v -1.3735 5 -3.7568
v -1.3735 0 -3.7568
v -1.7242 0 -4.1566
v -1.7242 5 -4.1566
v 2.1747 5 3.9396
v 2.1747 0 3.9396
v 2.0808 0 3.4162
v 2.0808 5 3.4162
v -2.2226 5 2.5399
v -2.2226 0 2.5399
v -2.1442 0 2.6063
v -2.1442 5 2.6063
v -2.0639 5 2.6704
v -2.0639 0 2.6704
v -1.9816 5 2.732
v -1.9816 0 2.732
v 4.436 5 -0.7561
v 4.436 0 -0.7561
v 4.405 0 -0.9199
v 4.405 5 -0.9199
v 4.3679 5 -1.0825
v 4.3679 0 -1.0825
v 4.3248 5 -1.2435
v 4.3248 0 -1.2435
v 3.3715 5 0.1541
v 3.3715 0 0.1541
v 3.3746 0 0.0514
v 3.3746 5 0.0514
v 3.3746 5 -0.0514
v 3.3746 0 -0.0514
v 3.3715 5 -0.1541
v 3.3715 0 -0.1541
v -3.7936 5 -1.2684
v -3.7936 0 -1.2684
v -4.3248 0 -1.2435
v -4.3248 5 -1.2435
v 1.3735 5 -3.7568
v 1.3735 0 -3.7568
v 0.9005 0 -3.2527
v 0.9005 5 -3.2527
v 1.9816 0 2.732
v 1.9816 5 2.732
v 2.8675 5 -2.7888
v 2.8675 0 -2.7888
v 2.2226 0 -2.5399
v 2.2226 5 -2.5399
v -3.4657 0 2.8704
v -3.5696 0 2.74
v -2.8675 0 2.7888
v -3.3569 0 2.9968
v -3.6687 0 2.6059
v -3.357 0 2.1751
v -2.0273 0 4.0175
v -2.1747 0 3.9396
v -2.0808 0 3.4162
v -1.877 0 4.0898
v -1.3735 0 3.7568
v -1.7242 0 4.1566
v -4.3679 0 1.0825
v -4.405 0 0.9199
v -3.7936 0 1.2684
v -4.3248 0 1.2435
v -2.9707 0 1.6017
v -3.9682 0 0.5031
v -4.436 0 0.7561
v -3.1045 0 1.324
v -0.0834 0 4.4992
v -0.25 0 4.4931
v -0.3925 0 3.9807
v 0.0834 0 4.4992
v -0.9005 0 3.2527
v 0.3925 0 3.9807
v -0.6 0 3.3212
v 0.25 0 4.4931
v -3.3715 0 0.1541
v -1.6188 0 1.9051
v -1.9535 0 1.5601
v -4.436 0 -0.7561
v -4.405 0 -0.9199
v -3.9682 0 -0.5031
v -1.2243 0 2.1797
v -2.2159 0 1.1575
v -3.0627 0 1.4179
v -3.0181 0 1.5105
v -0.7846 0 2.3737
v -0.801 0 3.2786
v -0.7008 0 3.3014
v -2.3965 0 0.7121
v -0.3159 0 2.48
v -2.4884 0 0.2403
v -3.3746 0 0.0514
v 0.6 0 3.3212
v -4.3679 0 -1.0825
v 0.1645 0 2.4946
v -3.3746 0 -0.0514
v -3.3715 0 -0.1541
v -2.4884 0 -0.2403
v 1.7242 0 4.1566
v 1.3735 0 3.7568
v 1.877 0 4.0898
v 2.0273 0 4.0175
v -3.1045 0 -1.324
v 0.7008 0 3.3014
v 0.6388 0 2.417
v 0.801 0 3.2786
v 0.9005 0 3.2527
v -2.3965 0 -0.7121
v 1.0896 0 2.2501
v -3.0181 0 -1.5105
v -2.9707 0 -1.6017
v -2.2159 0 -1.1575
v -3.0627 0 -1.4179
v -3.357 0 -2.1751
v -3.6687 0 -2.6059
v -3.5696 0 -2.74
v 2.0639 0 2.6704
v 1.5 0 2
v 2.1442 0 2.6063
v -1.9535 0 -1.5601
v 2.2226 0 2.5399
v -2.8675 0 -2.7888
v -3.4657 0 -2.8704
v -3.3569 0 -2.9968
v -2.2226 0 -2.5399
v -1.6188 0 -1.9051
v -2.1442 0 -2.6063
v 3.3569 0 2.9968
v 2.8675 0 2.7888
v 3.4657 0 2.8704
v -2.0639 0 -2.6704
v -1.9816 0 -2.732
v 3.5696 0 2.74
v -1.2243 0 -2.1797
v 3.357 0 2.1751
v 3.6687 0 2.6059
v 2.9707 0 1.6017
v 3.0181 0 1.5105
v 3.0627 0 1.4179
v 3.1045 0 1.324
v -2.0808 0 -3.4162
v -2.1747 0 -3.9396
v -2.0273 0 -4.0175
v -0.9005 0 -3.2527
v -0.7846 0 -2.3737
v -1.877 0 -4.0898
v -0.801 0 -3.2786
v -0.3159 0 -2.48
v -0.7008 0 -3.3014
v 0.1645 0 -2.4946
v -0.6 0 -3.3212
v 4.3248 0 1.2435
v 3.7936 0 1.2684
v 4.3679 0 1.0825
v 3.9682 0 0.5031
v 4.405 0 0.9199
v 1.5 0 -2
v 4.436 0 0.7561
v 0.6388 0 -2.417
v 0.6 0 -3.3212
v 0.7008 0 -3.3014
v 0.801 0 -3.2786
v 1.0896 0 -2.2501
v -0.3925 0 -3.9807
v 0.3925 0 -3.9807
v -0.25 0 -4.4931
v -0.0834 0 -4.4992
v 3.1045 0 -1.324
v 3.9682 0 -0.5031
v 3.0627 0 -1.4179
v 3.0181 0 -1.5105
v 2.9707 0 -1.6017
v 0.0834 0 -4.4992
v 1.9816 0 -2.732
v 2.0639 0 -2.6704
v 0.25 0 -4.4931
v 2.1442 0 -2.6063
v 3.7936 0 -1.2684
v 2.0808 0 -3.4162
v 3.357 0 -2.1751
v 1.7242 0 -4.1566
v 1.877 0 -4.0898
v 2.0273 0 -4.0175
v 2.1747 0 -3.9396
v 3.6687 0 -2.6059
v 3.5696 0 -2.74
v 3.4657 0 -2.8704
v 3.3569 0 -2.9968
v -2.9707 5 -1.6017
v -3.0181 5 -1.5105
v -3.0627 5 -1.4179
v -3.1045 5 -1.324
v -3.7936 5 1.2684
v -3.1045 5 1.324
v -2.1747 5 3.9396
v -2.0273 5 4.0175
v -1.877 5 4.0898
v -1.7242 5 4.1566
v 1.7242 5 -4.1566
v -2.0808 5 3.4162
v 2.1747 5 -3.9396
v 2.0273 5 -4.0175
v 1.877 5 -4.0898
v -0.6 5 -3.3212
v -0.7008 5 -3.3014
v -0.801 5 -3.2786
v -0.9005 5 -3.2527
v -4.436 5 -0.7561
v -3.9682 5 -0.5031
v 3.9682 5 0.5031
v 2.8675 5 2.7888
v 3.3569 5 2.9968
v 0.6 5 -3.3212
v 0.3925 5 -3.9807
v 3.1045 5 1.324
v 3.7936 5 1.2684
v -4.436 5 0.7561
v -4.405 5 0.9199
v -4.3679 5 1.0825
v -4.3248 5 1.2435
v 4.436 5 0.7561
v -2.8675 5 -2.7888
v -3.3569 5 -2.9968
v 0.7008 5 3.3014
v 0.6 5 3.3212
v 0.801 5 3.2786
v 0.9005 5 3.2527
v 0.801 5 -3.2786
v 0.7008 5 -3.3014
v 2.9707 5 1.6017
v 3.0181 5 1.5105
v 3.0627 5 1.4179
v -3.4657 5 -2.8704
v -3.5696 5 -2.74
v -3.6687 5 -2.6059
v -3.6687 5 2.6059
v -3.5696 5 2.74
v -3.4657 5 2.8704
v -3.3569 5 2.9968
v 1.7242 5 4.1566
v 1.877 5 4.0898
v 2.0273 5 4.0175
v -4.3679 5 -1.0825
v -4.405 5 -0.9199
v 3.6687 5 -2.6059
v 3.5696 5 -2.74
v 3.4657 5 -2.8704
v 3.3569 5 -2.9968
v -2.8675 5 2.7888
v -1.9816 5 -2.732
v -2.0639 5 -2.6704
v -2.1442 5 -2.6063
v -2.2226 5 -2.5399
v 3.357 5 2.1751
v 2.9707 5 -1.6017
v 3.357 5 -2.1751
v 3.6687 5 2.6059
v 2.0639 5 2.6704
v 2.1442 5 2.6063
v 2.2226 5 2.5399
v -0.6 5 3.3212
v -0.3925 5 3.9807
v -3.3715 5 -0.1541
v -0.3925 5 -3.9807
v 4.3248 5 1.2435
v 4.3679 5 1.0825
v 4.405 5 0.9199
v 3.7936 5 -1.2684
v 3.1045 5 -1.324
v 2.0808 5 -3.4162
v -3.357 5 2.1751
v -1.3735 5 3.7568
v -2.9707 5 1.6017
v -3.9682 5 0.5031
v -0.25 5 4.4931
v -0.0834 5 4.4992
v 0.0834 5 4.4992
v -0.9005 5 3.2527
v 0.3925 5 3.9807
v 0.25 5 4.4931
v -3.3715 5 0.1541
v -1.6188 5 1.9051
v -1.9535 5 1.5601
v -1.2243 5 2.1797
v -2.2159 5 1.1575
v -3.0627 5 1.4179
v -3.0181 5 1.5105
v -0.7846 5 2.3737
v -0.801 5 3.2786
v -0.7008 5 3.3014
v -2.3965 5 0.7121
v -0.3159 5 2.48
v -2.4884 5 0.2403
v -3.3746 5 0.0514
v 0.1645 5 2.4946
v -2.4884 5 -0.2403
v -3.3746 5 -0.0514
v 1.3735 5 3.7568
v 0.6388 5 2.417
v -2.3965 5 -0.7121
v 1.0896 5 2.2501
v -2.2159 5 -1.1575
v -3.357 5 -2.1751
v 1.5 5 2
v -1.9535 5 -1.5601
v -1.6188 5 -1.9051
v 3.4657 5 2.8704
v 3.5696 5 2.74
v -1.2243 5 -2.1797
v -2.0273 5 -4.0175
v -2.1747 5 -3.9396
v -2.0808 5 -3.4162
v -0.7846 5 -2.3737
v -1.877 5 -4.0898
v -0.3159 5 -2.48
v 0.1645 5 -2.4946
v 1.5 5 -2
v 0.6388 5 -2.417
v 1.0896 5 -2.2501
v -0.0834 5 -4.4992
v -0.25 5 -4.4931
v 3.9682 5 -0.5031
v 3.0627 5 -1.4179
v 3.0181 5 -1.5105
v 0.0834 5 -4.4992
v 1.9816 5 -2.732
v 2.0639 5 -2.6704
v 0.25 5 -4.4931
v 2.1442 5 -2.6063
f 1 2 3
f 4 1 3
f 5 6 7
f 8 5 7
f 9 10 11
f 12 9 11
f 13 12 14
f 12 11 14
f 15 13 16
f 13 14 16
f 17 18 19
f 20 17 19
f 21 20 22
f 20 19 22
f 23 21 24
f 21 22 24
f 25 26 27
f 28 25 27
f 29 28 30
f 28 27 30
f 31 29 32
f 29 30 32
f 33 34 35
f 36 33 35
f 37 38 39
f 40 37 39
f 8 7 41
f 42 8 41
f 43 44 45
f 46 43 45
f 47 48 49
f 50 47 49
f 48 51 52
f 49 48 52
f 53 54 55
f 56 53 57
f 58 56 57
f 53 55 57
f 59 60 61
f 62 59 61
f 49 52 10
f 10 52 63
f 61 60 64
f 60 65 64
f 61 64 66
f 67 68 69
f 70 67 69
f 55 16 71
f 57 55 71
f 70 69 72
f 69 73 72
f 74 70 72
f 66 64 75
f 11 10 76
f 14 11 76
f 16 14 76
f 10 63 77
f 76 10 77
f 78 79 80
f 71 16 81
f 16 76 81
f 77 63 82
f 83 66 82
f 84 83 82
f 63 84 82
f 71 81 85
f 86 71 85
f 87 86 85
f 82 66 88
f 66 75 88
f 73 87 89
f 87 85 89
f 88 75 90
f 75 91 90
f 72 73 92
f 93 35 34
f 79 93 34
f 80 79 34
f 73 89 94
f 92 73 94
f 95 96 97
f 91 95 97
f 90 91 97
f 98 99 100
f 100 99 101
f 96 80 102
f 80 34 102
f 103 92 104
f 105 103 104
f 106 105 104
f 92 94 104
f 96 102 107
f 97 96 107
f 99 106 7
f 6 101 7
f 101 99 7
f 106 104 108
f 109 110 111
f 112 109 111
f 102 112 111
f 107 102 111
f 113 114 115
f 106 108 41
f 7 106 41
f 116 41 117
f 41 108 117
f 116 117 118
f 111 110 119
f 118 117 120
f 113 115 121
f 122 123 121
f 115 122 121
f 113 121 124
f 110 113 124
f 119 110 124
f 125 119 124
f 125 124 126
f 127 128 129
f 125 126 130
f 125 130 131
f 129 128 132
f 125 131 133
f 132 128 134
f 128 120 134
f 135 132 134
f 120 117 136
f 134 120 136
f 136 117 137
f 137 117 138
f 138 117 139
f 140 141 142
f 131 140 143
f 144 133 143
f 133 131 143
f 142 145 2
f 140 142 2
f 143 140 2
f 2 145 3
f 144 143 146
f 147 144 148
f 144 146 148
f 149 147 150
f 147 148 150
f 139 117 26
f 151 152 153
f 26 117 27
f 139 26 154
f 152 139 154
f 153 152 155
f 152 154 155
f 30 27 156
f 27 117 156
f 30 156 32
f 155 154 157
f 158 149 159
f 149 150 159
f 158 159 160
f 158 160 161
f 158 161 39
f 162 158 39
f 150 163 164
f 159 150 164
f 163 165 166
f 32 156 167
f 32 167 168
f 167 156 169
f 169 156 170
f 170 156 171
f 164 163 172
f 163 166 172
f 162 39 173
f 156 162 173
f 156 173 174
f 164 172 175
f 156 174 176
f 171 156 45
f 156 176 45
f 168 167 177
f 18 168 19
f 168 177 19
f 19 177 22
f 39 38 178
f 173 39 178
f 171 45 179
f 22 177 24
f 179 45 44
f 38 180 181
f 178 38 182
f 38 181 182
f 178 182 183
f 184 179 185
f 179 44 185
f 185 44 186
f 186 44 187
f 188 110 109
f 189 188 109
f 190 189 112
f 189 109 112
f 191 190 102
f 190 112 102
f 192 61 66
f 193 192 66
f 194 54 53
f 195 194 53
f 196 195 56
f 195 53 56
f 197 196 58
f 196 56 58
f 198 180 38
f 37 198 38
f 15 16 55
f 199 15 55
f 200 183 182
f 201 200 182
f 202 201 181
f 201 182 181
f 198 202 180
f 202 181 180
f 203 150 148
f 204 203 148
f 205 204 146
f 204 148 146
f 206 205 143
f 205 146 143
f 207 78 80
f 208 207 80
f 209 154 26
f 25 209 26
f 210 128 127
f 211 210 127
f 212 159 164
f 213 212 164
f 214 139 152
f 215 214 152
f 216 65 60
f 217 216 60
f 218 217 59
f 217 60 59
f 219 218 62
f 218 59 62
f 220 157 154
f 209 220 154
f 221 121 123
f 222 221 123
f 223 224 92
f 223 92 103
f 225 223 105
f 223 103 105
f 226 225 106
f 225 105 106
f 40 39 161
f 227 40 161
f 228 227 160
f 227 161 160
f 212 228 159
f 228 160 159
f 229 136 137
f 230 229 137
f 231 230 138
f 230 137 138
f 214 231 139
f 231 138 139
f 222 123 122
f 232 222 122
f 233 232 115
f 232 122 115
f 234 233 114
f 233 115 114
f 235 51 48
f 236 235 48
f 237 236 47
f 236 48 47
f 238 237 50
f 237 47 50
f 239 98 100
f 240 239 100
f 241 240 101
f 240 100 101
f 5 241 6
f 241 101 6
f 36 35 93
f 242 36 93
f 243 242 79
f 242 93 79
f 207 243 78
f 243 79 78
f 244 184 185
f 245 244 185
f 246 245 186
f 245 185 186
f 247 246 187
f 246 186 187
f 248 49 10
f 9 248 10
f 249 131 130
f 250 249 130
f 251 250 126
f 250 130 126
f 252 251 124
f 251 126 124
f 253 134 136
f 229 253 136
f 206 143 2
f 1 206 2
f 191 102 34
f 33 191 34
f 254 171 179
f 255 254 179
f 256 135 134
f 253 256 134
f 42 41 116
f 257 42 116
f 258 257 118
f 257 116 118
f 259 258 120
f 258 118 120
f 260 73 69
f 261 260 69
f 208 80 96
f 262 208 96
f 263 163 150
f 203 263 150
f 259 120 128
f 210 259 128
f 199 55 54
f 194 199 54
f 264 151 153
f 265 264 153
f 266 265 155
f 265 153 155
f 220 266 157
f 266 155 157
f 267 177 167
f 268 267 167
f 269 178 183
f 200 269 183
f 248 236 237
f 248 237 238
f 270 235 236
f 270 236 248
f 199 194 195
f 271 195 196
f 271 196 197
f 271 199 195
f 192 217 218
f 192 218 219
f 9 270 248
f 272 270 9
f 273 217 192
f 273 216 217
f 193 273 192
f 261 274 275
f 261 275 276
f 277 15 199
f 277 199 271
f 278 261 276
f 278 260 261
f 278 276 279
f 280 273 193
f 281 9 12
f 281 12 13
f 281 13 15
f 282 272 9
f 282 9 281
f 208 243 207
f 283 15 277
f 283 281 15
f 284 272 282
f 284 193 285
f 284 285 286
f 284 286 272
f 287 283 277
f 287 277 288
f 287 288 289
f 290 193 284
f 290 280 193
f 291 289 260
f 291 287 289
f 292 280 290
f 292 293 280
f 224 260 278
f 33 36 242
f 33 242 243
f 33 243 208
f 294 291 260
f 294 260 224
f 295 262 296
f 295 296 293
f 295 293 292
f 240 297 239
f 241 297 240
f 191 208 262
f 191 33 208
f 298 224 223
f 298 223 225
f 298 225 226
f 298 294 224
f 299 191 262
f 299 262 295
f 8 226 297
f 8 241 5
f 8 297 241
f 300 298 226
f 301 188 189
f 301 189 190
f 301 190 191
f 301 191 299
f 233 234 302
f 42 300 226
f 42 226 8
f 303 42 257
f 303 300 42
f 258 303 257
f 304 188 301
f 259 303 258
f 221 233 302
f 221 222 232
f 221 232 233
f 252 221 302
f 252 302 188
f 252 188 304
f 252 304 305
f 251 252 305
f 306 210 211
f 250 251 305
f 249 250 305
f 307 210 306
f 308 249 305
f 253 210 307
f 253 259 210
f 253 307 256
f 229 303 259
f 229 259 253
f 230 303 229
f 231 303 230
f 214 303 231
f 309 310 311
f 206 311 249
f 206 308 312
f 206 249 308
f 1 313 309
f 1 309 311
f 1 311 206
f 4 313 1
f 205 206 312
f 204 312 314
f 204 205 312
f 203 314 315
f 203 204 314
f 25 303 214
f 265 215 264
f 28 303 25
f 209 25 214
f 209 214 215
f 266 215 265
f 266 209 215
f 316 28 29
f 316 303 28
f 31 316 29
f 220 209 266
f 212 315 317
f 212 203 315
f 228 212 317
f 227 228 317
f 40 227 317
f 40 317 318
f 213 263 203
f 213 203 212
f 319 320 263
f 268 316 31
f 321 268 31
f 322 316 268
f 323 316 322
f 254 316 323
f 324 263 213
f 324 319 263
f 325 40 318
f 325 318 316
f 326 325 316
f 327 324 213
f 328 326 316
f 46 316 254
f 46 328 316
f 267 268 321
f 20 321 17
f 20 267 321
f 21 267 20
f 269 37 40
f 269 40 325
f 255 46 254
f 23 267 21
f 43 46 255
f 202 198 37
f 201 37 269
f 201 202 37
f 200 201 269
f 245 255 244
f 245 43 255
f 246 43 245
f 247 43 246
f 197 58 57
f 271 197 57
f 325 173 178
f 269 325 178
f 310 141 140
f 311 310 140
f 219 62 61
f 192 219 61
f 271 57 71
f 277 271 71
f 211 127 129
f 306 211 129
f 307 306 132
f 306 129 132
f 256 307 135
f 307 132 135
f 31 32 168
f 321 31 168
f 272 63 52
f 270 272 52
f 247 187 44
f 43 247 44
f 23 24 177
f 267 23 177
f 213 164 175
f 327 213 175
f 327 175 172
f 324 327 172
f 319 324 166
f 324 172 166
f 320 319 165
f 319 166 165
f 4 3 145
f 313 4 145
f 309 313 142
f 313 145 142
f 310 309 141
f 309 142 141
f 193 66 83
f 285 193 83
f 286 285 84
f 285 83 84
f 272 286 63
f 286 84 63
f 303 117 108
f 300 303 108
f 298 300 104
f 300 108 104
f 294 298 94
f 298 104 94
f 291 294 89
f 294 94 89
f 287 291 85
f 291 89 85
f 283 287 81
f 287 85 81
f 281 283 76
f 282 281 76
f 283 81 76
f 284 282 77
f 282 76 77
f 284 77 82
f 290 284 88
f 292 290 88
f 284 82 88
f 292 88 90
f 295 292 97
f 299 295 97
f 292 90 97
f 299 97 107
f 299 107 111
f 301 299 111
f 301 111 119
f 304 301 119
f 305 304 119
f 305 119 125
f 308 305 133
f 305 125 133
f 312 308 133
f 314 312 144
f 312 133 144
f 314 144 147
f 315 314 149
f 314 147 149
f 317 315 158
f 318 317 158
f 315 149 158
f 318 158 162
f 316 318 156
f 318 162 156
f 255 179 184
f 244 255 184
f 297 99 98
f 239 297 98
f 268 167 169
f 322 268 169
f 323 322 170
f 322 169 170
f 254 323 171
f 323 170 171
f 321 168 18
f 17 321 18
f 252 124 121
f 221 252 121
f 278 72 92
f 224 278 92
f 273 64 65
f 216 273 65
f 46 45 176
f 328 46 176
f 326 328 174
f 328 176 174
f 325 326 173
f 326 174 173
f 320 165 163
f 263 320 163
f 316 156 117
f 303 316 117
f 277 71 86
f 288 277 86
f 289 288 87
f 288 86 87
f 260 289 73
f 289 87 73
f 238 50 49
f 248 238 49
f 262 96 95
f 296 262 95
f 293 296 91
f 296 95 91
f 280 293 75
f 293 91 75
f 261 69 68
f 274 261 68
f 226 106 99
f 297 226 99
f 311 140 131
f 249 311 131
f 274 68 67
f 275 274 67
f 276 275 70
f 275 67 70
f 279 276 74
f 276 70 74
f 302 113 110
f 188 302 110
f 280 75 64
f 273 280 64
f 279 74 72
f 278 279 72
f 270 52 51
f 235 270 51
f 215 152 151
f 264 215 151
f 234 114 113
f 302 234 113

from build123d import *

# Parameters (mm, degrees)
BOSS_EXTRUDE1_DEPTH = 5
CIRPATTERN1_DEPTH   = 5


# Read off the part's stored shape, not the designer's step: CirPattern1
with BuildPart() as part:
    # Sketch2 → Boss-Extrude1 (new body)
    with BuildSketch(Plane(origin=(0, 0, 0), x_dir=(1, 0, 0), z_dir=(0, 1, 0))):
        with BuildLine():
            Line((-0.3925, 3.98069639), (-0.6, 3.321238474))
            ThreePointArc((-0.6, 3.321238474), (0, -3.375), (0.6, 3.321238474))
            Line((0.6, 3.321238474), (0.3925, 3.98069639))
            Line((0.3925, 3.98069639), (0.25, 4.493050189))
            ThreePointArc((0.25, 4.493050189), (0, 4.5), (-0.25, 4.493050189))
            Line((-0.25, 4.493050189), (-0.3925, 3.98069639))
        make_face()
        with BuildLine():
            Line((1.5, 2), (1.5, -2))
            ThreePointArc((1.5, -2), (-2.5, 0), (1.5, 2))
        make_face(mode=Mode.SUBTRACT)
    extrude(amount=BOSS_EXTRUDE1_DEPTH)

    # CirPattern1 outline → CirPattern1 (add)
    with BuildSketch(Plane(origin=(0, 0, 0), x_dir=(1, 0, 0), z_dir=(0, 1, 0))):
        with BuildLine():
            Line((1.724219199, 4.156569277), (1.373529153, 3.756782888))
            Line((1.373529153, 3.756782888), (0.900450047, 3.252662711))
            ThreePointArc((0.900450047, 3.252662711), (1.46435762, 3.040769929), (1.981612688, 2.732002224))
            Line((1.981612688, 2.732002224), (2.080789715, 3.416184152))
            Line((2.080789715, 3.416184152), (2.174703633, 3.939627407))
            ThreePointArc((2.174703633, 3.939627407), (1.952476826, 4.054359906), (1.724219199, 4.156569277))
        make_face()
        with BuildLine():
            Line((-2.080789715, 3.416184152), (-1.981612688, 2.732002224))
            ThreePointArc((-1.981612688, 2.732002224), (-1.46435762, 3.040769929), (-0.900450047, 3.252662711))
            Line((-0.900450047, 3.252662711), (-1.373529153, 3.756782888))
            Line((-1.373529153, 3.756782888), (-1.724219199, 4.156569277))
            ThreePointArc((-1.724219199, 4.156569277), (-1.952476826, 4.054359906), (-2.174703633, 3.939627407))
            Line((-2.174703633, 3.939627407), (-2.080789715, 3.416184152))
        make_face()
        with BuildLine():
            Line((-3.356953507, 2.175054747), (-2.970742681, 1.601659428))
            ThreePointArc((-2.970742681, 1.601659428), (-2.638681254, 2.104278081), (-2.222554919, 2.539857207))
            Line((-2.222554919, 2.539857207), (-2.867514013, 2.78879246))
            Line((-2.867514013, 2.78879246), (-3.35693564, 2.996828843))
            ThreePointArc((-3.35693564, 2.996828843), (-3.518241671, 2.805704108), (-3.66868054, 2.605913101))
            Line((-3.66868054, 2.605913101), (-3.356953507, 2.175054747))
        make_face()
        with BuildLine():
            Line((-3.968231487, 0.503129073), (-3.371480652, 0.15408834))
            ThreePointArc((-3.371480652, 0.15408834), (-3.290381704, 0.751008152), (-3.104455531, 1.324001834))
            Line((-3.104455531, 1.324001834), (-3.793552554, 1.268447484))
            Line((-3.793552554, 1.268447484), (-4.324769807, 1.243529702))
            ThreePointArc((-4.324769807, 1.243529702), (-4.387175605, 1.001344203), (-4.436030273, 0.756065746))
            Line((-4.436030273, 0.756065746), (-3.968231487, 0.503129073))
        make_face()
        with BuildLine():
            Line((-3.793552554, -1.268447484), (-3.104455531, -1.324001834))
            ThreePointArc((-3.104455531, -1.324001834), (-3.290381704, -0.751008152), (-3.371480652, -0.15408834))
            Line((-3.371480652, -0.15408834), (-3.968231487, -0.503129073))
            Line((-3.968231487, -0.503129073), (-4.436030273, -0.756065746))
            ThreePointArc((-4.436030273, -0.756065746), (-4.387175605, -1.001344203), (-4.324769807, -1.243529702))
            Line((-4.324769807, -1.243529702), (-3.793552554, -1.268447484))
        make_face()
        with BuildLine():
            Line((-2.867514013, -2.78879246), (-2.222554919, -2.539857207))
            ThreePointArc((-2.222554919, -2.539857207), (-2.638681254, -2.104278081), (-2.970742681, -1.601659428))
            Line((-2.970742681, -1.601659428), (-3.356953507, -2.175054747))
            Line((-3.356953507, -2.175054747), (-3.66868054, -2.605913101))
            ThreePointArc((-3.66868054, -2.605913101), (-3.518241671, -2.805704108), (-3.35693564, -2.996828843))
            Line((-3.35693564, -2.996828843), (-2.867514013, -2.78879246))
        make_face()
        with BuildLine():
            Line((-1.373529153, -3.756782888), (-0.900450047, -3.252662711))
            ThreePointArc((-0.900450047, -3.252662711), (-1.46435762, -3.040769929), (-1.981612688, -2.732002224))
            Line((-1.981612688, -2.732002224), (-2.080789715, -3.416184152))
            Line((-2.080789715, -3.416184152), (-2.174703633, -3.939627407))
            ThreePointArc((-2.174703633, -3.939627407), (-1.952476826, -4.054359906), (-1.724219199, -4.156569277))
            Line((-1.724219199, -4.156569277), (-1.373529153, -3.756782888))
        make_face()
        with BuildLine():
            Line((0.3925, -3.98069639), (0.6, -3.321238474))
            ThreePointArc((0.6, -3.321238474), (0, -3.375), (-0.6, -3.321238474))
            Line((-0.6, -3.321238474), (-0.3925, -3.98069639))
            Line((-0.3925, -3.98069639), (-0.25, -4.493050189))
            ThreePointArc((-0.25, -4.493050189), (0, -4.5), (0.25, -4.493050189))
            Line((0.25, -4.493050189), (0.3925, -3.98069639))
        make_face()
        with BuildLine():
            Line((2.080789715, -3.416184152), (1.981612688, -2.732002224))
            ThreePointArc((1.981612688, -2.732002224), (1.46435762, -3.040769929), (0.900450047, -3.252662711))
            Line((0.900450047, -3.252662711), (1.373529153, -3.756782888))
            Line((1.373529153, -3.756782888), (1.724219199, -4.156569277))
            ThreePointArc((1.724219199, -4.156569277), (1.952476826, -4.054359906), (2.174703633, -3.939627407))
            Line((2.174703633, -3.939627407), (2.080789715, -3.416184152))
        make_face()
        with BuildLine():
            Line((3.356953507, -2.175054747), (2.970742681, -1.601659428))
            ThreePointArc((2.970742681, -1.601659428), (2.638681254, -2.104278081), (2.222554919, -2.539857207))
            Line((2.222554919, -2.539857207), (2.867514013, -2.78879246))
            Line((2.867514013, -2.78879246), (3.35693564, -2.996828843))
            ThreePointArc((3.35693564, -2.996828843), (3.518241671, -2.805704108), (3.66868054, -2.605913101))
            Line((3.66868054, -2.605913101), (3.356953507, -2.175054747))
        make_face()
        with BuildLine():
            Line((3.968231487, -0.503129073), (3.371480652, -0.15408834))
            ThreePointArc((3.371480652, -0.15408834), (3.290381704, -0.751008152), (3.104455531, -1.324001834))
            Line((3.104455531, -1.324001834), (3.793552554, -1.268447484))
            Line((3.793552554, -1.268447484), (4.324769807, -1.243529702))
            ThreePointArc((4.324769807, -1.243529702), (4.387175605, -1.001344203), (4.436030273, -0.756065746))
            Line((4.436030273, -0.756065746), (3.968231487, -0.503129073))
        make_face()
        with BuildLine():
            Line((3.793552554, 1.268447484), (3.104455531, 1.324001834))
            ThreePointArc((3.104455531, 1.324001834), (3.290381704, 0.751008152), (3.371480652, 0.15408834))
            Line((3.371480652, 0.15408834), (3.968231487, 0.503129073))
            Line((3.968231487, 0.503129073), (4.436030273, 0.756065746))
            ThreePointArc((4.436030273, 0.756065746), (4.387175605, 1.001344203), (4.324769807, 1.243529702))
            Line((4.324769807, 1.243529702), (3.793552554, 1.268447484))
        make_face()
        with BuildLine():
            Line((2.867514013, 2.78879246), (2.222554919, 2.539857207))
            ThreePointArc((2.222554919, 2.539857207), (2.638681254, 2.104278081), (2.970742681, 1.601659428))
            Line((2.970742681, 1.601659428), (3.356953507, 2.175054747))
            Line((3.356953507, 2.175054747), (3.66868054, 2.605913101))
            ThreePointArc((3.66868054, 2.605913101), (3.518241671, 2.805704108), (3.35693564, 2.996828843))
            Line((3.35693564, 2.996828843), (2.867514013, 2.78879246))
        make_face()
    extrude(amount=CIRPATTERN1_DEPTH)


solid = part.part
